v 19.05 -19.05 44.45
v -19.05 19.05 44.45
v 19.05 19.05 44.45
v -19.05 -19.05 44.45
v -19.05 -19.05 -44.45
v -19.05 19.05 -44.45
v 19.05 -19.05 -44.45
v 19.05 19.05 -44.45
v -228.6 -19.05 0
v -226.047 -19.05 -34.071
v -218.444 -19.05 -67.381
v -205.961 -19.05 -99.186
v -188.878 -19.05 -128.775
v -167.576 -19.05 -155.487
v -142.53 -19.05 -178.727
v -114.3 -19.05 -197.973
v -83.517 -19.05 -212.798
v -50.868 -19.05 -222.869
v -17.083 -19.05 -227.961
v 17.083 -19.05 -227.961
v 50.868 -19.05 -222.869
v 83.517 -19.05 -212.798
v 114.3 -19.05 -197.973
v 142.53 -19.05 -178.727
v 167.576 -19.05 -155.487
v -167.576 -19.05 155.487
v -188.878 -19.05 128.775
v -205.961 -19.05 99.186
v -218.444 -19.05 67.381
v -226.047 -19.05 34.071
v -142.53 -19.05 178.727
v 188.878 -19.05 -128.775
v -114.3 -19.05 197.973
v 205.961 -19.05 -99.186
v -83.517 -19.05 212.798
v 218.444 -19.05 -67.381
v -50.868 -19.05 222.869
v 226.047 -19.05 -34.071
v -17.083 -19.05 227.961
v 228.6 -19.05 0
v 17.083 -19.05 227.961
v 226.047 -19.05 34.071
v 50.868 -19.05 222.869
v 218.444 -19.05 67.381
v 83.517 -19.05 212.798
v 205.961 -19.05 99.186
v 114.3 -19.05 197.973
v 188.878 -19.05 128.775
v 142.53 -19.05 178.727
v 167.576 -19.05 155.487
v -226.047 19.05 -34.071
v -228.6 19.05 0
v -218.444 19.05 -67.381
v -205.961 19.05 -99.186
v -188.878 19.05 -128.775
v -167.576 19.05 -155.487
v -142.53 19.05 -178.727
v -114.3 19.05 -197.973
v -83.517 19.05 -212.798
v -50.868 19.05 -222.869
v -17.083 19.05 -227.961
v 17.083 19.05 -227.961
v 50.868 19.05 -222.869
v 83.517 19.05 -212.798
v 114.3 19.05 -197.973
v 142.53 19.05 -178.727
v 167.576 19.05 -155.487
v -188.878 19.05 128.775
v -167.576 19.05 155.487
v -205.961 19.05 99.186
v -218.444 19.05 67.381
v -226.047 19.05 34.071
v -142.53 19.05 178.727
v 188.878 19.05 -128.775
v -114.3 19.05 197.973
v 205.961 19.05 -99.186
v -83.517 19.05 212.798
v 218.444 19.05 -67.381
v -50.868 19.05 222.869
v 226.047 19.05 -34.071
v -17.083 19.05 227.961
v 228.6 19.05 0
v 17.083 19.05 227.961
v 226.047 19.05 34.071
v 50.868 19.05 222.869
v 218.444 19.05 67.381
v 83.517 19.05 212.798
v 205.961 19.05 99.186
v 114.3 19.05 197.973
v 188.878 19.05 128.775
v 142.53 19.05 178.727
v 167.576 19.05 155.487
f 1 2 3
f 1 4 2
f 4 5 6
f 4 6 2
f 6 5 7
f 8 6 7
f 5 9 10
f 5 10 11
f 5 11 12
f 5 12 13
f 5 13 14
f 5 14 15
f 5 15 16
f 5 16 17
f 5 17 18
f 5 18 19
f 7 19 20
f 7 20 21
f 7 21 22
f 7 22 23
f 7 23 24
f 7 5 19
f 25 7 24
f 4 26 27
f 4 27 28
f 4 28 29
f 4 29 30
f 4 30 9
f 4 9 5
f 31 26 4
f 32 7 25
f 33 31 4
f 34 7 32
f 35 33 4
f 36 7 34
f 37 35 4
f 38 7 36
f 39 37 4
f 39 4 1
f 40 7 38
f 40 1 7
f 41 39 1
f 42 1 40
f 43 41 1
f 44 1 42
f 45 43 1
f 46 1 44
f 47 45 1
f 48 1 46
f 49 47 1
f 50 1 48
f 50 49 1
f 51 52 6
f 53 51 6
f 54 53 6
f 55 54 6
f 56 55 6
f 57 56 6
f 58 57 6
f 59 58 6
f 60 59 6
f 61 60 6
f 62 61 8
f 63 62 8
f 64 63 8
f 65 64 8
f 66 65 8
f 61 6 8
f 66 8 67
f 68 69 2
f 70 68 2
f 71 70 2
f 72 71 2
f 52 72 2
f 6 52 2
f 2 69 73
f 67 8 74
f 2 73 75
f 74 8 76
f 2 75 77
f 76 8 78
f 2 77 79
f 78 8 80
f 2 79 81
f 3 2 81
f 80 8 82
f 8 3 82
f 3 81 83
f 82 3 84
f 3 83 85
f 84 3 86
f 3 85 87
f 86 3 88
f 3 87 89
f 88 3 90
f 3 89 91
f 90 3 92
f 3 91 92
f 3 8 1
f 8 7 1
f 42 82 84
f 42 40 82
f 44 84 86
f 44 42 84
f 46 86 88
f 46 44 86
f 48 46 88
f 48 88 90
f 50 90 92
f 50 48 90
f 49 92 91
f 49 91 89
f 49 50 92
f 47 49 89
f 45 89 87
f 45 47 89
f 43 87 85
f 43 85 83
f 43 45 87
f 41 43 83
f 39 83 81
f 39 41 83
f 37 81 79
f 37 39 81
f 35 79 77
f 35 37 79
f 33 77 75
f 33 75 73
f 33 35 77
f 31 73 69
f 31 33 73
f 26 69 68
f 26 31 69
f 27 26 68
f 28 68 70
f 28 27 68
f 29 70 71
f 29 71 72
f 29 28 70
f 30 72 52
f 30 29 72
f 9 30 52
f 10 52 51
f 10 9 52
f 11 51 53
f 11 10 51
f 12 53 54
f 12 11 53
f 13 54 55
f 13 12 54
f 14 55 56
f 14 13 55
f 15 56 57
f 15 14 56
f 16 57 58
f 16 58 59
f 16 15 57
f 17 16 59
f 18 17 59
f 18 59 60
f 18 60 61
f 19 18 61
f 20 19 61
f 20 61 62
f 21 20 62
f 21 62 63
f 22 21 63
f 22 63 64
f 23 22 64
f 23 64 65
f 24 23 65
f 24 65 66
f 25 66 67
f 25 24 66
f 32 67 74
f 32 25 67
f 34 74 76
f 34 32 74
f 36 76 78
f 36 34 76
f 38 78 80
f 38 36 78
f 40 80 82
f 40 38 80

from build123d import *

# Parameters (mm, degrees)
F0_R     = 228.6
F0_W     = 38.1
F0_H     = 88.9
F1_DEPTH = 19.05


with BuildPart() as f1:
    # F0 (on Front) → F1 (new body, symmetric)
    with BuildSketch(Plane.XZ):
        Circle(F0_R)
        Rectangle(F0_W, F0_H, mode=Mode.SUBTRACT)
    extrude(amount=F1_DEPTH, both=True)


solid = f1.part
